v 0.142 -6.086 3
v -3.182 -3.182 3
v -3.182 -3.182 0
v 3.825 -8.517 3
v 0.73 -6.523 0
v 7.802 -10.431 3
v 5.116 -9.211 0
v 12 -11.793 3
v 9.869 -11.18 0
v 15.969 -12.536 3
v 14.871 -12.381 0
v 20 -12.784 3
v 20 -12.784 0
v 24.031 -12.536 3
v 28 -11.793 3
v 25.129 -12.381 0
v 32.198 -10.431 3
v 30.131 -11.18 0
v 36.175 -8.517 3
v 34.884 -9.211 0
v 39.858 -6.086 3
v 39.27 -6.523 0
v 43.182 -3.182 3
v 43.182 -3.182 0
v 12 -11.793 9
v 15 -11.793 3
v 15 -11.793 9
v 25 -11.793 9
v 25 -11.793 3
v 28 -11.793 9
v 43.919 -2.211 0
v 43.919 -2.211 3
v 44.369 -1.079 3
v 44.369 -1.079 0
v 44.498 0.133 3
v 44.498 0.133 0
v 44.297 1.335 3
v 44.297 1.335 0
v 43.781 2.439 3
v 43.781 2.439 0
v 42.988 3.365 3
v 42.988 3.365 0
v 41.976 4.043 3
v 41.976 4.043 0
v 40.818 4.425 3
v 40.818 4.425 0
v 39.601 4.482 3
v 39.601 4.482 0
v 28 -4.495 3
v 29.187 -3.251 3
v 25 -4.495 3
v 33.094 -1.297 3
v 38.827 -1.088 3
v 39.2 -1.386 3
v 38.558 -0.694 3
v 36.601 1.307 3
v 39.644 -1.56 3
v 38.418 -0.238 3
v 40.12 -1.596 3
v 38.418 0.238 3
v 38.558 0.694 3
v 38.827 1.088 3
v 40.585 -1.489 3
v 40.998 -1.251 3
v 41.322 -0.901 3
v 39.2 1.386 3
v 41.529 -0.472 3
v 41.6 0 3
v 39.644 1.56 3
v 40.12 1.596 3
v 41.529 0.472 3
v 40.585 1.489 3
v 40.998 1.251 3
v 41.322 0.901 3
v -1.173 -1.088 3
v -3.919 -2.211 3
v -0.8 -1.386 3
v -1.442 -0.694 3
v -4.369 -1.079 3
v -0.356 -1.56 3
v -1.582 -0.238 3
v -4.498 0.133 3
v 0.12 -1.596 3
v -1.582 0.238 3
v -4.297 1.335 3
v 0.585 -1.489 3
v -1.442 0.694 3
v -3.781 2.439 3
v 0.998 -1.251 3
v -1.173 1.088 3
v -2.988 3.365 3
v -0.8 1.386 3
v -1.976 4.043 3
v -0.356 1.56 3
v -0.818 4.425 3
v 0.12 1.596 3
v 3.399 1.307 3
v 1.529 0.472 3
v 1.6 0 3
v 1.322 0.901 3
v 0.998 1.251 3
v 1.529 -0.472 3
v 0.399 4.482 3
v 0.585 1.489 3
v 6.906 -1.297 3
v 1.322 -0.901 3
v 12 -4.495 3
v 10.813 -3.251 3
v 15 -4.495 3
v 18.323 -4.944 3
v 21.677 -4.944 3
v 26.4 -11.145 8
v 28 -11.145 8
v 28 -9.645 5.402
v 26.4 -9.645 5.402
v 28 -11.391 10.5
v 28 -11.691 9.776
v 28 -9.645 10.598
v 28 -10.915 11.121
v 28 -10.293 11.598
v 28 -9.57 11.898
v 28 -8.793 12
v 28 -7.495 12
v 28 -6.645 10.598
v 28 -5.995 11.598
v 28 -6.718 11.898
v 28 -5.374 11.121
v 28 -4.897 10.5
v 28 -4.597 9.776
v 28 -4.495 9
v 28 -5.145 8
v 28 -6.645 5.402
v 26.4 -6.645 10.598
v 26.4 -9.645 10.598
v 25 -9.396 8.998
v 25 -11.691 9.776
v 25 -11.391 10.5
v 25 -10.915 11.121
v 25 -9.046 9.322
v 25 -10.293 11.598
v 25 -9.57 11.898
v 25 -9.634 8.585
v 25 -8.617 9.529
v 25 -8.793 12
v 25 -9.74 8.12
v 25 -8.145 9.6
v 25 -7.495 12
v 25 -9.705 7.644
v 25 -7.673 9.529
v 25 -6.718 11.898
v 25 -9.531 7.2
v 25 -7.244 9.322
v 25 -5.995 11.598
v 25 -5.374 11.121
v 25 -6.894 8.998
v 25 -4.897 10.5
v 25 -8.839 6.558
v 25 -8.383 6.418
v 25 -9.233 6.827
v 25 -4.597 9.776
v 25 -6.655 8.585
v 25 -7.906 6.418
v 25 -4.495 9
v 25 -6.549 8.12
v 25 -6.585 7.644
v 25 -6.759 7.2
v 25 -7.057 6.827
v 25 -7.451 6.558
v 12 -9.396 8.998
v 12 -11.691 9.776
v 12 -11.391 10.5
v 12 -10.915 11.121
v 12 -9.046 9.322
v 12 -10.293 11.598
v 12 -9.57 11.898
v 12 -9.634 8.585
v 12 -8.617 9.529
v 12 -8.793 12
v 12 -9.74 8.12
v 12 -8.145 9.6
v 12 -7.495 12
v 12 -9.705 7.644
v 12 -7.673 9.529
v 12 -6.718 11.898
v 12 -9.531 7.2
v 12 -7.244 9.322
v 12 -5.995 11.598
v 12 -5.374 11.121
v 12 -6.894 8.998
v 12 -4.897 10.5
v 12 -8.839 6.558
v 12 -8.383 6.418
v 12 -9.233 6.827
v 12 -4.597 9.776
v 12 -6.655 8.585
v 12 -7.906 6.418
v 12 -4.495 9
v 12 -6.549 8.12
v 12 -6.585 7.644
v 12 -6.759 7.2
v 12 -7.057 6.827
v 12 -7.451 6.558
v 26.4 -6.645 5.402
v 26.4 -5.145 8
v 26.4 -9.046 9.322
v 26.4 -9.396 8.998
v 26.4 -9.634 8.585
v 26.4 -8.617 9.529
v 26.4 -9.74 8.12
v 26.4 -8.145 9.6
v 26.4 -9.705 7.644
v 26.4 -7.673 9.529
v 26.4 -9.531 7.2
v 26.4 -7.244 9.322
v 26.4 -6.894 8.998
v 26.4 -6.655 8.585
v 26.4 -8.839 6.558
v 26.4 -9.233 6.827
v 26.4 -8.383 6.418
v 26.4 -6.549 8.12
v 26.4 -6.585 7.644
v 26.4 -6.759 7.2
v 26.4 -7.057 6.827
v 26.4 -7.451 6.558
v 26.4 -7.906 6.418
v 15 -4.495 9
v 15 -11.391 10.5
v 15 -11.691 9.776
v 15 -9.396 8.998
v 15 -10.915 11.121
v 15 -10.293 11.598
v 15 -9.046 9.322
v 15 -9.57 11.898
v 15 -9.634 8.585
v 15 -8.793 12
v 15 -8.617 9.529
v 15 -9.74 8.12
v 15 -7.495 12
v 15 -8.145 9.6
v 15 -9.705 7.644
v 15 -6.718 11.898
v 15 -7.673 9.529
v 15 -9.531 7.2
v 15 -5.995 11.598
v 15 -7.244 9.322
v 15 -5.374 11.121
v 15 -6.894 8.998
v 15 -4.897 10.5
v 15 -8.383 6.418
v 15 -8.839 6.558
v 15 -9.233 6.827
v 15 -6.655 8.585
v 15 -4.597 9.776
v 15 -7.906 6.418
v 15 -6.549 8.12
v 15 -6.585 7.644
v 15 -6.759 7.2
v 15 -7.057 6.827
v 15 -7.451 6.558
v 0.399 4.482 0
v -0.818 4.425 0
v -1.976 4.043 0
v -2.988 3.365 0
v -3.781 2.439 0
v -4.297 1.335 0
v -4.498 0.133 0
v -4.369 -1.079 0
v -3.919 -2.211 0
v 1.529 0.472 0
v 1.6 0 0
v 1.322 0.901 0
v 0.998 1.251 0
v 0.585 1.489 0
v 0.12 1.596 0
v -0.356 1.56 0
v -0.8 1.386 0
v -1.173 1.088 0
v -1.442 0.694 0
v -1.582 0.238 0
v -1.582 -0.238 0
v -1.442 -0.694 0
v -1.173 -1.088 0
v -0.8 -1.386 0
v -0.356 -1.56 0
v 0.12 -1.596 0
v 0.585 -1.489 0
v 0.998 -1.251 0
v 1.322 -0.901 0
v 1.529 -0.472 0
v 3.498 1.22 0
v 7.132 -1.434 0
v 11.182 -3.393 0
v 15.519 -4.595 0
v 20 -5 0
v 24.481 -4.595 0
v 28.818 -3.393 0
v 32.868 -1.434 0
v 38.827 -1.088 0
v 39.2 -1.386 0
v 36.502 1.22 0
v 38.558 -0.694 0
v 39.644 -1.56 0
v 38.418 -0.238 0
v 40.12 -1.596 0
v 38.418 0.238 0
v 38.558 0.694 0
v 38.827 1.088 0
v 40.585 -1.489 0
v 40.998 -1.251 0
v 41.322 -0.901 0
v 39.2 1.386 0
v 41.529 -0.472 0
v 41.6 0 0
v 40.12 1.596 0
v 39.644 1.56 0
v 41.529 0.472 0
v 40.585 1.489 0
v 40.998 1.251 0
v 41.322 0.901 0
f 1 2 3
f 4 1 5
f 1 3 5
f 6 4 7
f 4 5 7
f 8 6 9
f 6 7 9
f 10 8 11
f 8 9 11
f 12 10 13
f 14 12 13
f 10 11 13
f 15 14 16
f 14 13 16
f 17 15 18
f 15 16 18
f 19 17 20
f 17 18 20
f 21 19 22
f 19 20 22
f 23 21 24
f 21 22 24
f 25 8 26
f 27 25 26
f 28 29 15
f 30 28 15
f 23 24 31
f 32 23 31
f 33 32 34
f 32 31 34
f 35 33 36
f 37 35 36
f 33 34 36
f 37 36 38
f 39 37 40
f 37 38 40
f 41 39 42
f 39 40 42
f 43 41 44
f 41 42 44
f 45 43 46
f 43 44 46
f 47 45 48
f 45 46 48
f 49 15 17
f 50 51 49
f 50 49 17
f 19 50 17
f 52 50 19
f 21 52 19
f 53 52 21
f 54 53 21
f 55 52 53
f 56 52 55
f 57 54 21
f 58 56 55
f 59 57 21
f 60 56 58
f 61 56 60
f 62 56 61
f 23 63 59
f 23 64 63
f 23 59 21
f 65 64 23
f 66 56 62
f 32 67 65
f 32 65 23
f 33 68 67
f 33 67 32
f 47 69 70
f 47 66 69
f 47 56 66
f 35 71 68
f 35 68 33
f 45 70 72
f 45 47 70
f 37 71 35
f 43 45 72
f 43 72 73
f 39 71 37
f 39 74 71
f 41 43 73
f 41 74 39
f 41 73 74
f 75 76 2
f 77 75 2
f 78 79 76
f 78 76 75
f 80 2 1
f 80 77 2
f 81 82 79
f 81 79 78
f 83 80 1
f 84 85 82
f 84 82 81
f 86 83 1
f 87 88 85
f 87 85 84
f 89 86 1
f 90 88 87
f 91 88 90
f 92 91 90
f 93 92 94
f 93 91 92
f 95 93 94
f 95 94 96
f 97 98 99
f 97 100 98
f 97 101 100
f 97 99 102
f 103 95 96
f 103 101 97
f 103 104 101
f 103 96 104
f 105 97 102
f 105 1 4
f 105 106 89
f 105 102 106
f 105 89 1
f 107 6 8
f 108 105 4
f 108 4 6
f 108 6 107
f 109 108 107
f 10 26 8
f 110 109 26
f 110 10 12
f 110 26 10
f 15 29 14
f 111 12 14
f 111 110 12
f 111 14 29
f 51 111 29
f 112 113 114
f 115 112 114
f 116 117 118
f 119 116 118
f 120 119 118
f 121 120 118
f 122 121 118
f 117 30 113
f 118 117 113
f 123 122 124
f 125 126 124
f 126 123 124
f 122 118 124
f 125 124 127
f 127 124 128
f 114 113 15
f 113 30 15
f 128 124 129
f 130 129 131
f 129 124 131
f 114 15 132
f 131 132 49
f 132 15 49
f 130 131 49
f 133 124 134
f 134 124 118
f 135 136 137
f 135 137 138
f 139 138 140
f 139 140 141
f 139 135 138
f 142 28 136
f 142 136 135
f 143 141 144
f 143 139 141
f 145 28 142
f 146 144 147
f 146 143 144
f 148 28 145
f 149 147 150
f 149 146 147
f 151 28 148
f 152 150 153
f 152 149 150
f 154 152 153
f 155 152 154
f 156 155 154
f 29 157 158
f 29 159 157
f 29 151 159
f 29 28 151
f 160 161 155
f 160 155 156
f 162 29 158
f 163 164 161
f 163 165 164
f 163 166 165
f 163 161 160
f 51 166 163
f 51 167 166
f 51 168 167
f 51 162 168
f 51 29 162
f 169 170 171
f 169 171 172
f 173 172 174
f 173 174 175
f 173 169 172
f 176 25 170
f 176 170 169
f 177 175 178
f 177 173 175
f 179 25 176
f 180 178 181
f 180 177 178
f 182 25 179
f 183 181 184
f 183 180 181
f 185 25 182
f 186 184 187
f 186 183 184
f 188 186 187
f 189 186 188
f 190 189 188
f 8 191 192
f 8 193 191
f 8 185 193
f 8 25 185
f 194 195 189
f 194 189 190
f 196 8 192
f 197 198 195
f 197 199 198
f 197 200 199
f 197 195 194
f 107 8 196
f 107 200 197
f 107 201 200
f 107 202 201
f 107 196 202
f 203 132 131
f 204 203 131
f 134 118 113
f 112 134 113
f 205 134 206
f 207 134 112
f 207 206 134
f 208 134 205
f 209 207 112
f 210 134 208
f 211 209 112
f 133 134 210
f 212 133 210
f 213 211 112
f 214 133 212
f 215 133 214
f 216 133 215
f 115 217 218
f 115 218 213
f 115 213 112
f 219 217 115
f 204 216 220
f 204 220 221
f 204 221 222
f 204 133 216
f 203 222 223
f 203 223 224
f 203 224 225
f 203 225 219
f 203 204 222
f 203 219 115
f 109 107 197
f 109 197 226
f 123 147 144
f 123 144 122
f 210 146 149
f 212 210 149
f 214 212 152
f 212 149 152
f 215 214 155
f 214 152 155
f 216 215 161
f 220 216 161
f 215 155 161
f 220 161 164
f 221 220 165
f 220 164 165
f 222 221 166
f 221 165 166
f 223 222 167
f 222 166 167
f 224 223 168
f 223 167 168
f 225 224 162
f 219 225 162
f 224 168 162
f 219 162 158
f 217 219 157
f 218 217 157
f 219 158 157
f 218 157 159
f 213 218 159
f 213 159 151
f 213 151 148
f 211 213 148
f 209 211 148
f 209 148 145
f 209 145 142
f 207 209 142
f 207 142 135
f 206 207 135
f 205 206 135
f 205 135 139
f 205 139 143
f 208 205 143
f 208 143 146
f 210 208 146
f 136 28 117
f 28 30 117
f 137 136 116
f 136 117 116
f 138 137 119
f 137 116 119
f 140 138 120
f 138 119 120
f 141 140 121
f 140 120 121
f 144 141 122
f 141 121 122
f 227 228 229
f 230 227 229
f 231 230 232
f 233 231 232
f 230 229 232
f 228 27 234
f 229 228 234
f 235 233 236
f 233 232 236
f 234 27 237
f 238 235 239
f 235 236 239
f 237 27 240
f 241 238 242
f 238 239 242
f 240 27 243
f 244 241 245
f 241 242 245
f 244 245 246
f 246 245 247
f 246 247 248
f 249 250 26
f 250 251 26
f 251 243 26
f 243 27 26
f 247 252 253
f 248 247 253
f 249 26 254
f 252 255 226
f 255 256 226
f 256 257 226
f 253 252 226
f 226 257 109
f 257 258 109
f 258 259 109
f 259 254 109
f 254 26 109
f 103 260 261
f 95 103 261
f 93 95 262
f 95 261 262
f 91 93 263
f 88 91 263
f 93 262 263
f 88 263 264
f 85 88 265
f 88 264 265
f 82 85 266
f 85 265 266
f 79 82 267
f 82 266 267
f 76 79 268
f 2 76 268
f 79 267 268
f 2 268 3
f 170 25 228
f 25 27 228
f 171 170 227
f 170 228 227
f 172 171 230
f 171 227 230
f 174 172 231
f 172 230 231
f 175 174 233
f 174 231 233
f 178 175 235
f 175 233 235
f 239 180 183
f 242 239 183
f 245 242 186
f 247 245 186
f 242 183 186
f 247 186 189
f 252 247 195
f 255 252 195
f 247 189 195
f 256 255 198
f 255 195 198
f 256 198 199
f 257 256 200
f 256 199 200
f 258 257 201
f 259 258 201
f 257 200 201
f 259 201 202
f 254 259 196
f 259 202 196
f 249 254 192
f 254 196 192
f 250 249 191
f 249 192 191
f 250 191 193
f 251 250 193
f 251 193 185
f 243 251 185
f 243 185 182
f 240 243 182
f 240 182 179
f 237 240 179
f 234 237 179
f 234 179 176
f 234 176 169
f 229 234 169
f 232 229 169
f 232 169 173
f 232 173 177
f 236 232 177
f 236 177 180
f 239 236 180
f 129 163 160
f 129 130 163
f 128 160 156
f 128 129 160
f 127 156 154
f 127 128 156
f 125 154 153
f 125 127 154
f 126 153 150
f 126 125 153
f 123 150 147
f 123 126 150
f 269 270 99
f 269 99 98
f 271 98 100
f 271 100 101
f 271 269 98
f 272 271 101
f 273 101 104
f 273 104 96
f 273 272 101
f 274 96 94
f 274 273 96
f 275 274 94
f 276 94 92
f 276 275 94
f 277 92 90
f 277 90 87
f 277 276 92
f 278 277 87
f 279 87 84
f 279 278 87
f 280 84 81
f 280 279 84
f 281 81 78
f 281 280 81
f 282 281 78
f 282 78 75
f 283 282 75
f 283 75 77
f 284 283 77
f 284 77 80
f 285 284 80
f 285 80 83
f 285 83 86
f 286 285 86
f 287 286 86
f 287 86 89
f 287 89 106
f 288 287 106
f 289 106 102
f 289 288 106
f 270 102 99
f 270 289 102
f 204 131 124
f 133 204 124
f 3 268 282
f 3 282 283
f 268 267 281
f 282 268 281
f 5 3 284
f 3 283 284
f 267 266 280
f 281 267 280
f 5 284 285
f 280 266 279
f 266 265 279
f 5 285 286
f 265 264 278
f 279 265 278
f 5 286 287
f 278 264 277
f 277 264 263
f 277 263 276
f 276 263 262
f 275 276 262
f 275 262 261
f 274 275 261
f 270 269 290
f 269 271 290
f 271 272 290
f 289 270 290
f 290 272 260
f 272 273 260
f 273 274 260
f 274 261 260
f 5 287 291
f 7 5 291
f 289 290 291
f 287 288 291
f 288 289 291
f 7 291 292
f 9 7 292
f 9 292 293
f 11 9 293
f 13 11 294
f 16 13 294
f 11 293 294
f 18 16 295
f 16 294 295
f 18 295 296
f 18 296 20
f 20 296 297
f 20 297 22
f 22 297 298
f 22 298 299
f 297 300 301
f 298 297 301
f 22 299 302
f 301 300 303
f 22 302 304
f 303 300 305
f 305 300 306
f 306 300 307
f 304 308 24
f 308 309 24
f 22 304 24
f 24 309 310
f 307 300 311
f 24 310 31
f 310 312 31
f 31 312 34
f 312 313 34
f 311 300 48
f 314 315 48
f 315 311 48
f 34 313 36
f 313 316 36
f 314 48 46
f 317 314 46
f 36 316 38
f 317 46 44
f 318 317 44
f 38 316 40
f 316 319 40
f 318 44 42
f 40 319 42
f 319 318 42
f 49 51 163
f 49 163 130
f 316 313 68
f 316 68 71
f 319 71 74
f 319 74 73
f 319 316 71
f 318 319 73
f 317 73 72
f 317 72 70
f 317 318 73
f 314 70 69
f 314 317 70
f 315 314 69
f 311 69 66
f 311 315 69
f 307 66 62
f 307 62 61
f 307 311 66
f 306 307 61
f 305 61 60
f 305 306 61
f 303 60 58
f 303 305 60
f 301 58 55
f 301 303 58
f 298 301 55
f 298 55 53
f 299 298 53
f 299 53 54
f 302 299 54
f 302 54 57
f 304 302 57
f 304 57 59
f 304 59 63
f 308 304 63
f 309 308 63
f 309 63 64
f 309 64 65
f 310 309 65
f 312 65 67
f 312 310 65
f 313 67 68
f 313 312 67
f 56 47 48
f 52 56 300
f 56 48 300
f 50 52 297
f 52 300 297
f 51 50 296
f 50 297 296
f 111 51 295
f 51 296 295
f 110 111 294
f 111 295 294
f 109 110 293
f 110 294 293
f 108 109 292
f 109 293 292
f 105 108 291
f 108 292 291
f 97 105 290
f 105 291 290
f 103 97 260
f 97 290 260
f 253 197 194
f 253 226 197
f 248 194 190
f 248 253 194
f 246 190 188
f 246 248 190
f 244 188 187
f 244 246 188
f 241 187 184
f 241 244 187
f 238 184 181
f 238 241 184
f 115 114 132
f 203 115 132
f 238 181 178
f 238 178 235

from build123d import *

# Parameters (mm, degrees)
CROQUIS1_R              = 1.6
SALIENTE_EXTRUIR1_DEPTH = 3
CROQUIS2_W              = 3
CROQUIS2_H              = 7.298316333
SALIENTE_EXTRUIR2_DEPTH = 9
CROQUIS3_R              = 1.6
CORTAR_EXTRUIR1_DEPTH   = 16
CORTAR_EXTRUIR2_DEPTH   = 1.6
REDONDEO1_R             = 3


with BuildPart() as part:
    # Croquis1 → Saliente-Extruir1 (new body)
    with BuildSketch(Plane.XY):
        with BuildLine():
            ThreePointArc((0.398971354, 4.482278646), (-4.076947647, 1.904861643), (-3.181980515, -3.181980515))
            ThreePointArc((-3.181980515, -3.181980515), (20, -12.784271247), (43.181980515, -3.181980515))
            ThreePointArc((43.181980515, -3.181980515), (44.076947647, 1.904861643), (39.601028646, 4.482278646))
            ThreePointArc((39.601028646, 4.482278646), (20, -5), (0.398971354, 4.482278646))
        make_face()
        Circle(CROQUIS1_R, mode=Mode.SUBTRACT)
        with Locations((40, 0)):
            Circle(CROQUIS1_R, mode=Mode.SUBTRACT)
    extrude(amount=SALIENTE_EXTRUIR1_DEPTH)

    # Croquis2 → Saliente-Extruir2 (add)
    with BuildSketch(Plane.XY.offset(3)):
        with Locations((13.5, -8.144055595)):
            Rectangle(CROQUIS2_W, CROQUIS2_H)
        with Locations((26.5, -8.144055595)):
            Rectangle(CROQUIS2_W, CROQUIS2_H)
    extrude(amount=SALIENTE_EXTRUIR2_DEPTH)

    # Croquis3 → Cortar-Extruir1 (cut)
    with BuildSketch(Plane.ZY.offset(-12)):
        with Locations((8, -8.144897428)):
            Circle(CROQUIS3_R)
    extrude(amount=-CORTAR_EXTRUIR1_DEPTH, mode=Mode.SUBTRACT)

    # Croquis4 → Cortar-Extruir2 (cut)
    with BuildSketch(Plane(origin=(28, 0, 0), x_dir=(0, 0, -1), z_dir=(1, 0, 0))):
        Polygon((-5.401923789, -9.644897428), (-5.401923789, -6.644897428), (-8, -5.144897428), (-10.598076211, -6.644897428), (-10.598076211, -9.644897428), (-8, -11.144897428), align=None)
    extrude(amount=-CORTAR_EXTRUIR2_DEPTH, mode=Mode.SUBTRACT)

    # Redondeo1
    redondeo1_edges = [part.edges().sort_by_distance(p)[0] for p in [
        (13.5, -11.793213761, 12),
        (13.5, -4.494897428, 12),
        (26.5, -4.494897428, 12),
        (26.5, -11.793213761, 12),
    ]]
    fillet(redondeo1_edges, radius=REDONDEO1_R)


solid = part.part
